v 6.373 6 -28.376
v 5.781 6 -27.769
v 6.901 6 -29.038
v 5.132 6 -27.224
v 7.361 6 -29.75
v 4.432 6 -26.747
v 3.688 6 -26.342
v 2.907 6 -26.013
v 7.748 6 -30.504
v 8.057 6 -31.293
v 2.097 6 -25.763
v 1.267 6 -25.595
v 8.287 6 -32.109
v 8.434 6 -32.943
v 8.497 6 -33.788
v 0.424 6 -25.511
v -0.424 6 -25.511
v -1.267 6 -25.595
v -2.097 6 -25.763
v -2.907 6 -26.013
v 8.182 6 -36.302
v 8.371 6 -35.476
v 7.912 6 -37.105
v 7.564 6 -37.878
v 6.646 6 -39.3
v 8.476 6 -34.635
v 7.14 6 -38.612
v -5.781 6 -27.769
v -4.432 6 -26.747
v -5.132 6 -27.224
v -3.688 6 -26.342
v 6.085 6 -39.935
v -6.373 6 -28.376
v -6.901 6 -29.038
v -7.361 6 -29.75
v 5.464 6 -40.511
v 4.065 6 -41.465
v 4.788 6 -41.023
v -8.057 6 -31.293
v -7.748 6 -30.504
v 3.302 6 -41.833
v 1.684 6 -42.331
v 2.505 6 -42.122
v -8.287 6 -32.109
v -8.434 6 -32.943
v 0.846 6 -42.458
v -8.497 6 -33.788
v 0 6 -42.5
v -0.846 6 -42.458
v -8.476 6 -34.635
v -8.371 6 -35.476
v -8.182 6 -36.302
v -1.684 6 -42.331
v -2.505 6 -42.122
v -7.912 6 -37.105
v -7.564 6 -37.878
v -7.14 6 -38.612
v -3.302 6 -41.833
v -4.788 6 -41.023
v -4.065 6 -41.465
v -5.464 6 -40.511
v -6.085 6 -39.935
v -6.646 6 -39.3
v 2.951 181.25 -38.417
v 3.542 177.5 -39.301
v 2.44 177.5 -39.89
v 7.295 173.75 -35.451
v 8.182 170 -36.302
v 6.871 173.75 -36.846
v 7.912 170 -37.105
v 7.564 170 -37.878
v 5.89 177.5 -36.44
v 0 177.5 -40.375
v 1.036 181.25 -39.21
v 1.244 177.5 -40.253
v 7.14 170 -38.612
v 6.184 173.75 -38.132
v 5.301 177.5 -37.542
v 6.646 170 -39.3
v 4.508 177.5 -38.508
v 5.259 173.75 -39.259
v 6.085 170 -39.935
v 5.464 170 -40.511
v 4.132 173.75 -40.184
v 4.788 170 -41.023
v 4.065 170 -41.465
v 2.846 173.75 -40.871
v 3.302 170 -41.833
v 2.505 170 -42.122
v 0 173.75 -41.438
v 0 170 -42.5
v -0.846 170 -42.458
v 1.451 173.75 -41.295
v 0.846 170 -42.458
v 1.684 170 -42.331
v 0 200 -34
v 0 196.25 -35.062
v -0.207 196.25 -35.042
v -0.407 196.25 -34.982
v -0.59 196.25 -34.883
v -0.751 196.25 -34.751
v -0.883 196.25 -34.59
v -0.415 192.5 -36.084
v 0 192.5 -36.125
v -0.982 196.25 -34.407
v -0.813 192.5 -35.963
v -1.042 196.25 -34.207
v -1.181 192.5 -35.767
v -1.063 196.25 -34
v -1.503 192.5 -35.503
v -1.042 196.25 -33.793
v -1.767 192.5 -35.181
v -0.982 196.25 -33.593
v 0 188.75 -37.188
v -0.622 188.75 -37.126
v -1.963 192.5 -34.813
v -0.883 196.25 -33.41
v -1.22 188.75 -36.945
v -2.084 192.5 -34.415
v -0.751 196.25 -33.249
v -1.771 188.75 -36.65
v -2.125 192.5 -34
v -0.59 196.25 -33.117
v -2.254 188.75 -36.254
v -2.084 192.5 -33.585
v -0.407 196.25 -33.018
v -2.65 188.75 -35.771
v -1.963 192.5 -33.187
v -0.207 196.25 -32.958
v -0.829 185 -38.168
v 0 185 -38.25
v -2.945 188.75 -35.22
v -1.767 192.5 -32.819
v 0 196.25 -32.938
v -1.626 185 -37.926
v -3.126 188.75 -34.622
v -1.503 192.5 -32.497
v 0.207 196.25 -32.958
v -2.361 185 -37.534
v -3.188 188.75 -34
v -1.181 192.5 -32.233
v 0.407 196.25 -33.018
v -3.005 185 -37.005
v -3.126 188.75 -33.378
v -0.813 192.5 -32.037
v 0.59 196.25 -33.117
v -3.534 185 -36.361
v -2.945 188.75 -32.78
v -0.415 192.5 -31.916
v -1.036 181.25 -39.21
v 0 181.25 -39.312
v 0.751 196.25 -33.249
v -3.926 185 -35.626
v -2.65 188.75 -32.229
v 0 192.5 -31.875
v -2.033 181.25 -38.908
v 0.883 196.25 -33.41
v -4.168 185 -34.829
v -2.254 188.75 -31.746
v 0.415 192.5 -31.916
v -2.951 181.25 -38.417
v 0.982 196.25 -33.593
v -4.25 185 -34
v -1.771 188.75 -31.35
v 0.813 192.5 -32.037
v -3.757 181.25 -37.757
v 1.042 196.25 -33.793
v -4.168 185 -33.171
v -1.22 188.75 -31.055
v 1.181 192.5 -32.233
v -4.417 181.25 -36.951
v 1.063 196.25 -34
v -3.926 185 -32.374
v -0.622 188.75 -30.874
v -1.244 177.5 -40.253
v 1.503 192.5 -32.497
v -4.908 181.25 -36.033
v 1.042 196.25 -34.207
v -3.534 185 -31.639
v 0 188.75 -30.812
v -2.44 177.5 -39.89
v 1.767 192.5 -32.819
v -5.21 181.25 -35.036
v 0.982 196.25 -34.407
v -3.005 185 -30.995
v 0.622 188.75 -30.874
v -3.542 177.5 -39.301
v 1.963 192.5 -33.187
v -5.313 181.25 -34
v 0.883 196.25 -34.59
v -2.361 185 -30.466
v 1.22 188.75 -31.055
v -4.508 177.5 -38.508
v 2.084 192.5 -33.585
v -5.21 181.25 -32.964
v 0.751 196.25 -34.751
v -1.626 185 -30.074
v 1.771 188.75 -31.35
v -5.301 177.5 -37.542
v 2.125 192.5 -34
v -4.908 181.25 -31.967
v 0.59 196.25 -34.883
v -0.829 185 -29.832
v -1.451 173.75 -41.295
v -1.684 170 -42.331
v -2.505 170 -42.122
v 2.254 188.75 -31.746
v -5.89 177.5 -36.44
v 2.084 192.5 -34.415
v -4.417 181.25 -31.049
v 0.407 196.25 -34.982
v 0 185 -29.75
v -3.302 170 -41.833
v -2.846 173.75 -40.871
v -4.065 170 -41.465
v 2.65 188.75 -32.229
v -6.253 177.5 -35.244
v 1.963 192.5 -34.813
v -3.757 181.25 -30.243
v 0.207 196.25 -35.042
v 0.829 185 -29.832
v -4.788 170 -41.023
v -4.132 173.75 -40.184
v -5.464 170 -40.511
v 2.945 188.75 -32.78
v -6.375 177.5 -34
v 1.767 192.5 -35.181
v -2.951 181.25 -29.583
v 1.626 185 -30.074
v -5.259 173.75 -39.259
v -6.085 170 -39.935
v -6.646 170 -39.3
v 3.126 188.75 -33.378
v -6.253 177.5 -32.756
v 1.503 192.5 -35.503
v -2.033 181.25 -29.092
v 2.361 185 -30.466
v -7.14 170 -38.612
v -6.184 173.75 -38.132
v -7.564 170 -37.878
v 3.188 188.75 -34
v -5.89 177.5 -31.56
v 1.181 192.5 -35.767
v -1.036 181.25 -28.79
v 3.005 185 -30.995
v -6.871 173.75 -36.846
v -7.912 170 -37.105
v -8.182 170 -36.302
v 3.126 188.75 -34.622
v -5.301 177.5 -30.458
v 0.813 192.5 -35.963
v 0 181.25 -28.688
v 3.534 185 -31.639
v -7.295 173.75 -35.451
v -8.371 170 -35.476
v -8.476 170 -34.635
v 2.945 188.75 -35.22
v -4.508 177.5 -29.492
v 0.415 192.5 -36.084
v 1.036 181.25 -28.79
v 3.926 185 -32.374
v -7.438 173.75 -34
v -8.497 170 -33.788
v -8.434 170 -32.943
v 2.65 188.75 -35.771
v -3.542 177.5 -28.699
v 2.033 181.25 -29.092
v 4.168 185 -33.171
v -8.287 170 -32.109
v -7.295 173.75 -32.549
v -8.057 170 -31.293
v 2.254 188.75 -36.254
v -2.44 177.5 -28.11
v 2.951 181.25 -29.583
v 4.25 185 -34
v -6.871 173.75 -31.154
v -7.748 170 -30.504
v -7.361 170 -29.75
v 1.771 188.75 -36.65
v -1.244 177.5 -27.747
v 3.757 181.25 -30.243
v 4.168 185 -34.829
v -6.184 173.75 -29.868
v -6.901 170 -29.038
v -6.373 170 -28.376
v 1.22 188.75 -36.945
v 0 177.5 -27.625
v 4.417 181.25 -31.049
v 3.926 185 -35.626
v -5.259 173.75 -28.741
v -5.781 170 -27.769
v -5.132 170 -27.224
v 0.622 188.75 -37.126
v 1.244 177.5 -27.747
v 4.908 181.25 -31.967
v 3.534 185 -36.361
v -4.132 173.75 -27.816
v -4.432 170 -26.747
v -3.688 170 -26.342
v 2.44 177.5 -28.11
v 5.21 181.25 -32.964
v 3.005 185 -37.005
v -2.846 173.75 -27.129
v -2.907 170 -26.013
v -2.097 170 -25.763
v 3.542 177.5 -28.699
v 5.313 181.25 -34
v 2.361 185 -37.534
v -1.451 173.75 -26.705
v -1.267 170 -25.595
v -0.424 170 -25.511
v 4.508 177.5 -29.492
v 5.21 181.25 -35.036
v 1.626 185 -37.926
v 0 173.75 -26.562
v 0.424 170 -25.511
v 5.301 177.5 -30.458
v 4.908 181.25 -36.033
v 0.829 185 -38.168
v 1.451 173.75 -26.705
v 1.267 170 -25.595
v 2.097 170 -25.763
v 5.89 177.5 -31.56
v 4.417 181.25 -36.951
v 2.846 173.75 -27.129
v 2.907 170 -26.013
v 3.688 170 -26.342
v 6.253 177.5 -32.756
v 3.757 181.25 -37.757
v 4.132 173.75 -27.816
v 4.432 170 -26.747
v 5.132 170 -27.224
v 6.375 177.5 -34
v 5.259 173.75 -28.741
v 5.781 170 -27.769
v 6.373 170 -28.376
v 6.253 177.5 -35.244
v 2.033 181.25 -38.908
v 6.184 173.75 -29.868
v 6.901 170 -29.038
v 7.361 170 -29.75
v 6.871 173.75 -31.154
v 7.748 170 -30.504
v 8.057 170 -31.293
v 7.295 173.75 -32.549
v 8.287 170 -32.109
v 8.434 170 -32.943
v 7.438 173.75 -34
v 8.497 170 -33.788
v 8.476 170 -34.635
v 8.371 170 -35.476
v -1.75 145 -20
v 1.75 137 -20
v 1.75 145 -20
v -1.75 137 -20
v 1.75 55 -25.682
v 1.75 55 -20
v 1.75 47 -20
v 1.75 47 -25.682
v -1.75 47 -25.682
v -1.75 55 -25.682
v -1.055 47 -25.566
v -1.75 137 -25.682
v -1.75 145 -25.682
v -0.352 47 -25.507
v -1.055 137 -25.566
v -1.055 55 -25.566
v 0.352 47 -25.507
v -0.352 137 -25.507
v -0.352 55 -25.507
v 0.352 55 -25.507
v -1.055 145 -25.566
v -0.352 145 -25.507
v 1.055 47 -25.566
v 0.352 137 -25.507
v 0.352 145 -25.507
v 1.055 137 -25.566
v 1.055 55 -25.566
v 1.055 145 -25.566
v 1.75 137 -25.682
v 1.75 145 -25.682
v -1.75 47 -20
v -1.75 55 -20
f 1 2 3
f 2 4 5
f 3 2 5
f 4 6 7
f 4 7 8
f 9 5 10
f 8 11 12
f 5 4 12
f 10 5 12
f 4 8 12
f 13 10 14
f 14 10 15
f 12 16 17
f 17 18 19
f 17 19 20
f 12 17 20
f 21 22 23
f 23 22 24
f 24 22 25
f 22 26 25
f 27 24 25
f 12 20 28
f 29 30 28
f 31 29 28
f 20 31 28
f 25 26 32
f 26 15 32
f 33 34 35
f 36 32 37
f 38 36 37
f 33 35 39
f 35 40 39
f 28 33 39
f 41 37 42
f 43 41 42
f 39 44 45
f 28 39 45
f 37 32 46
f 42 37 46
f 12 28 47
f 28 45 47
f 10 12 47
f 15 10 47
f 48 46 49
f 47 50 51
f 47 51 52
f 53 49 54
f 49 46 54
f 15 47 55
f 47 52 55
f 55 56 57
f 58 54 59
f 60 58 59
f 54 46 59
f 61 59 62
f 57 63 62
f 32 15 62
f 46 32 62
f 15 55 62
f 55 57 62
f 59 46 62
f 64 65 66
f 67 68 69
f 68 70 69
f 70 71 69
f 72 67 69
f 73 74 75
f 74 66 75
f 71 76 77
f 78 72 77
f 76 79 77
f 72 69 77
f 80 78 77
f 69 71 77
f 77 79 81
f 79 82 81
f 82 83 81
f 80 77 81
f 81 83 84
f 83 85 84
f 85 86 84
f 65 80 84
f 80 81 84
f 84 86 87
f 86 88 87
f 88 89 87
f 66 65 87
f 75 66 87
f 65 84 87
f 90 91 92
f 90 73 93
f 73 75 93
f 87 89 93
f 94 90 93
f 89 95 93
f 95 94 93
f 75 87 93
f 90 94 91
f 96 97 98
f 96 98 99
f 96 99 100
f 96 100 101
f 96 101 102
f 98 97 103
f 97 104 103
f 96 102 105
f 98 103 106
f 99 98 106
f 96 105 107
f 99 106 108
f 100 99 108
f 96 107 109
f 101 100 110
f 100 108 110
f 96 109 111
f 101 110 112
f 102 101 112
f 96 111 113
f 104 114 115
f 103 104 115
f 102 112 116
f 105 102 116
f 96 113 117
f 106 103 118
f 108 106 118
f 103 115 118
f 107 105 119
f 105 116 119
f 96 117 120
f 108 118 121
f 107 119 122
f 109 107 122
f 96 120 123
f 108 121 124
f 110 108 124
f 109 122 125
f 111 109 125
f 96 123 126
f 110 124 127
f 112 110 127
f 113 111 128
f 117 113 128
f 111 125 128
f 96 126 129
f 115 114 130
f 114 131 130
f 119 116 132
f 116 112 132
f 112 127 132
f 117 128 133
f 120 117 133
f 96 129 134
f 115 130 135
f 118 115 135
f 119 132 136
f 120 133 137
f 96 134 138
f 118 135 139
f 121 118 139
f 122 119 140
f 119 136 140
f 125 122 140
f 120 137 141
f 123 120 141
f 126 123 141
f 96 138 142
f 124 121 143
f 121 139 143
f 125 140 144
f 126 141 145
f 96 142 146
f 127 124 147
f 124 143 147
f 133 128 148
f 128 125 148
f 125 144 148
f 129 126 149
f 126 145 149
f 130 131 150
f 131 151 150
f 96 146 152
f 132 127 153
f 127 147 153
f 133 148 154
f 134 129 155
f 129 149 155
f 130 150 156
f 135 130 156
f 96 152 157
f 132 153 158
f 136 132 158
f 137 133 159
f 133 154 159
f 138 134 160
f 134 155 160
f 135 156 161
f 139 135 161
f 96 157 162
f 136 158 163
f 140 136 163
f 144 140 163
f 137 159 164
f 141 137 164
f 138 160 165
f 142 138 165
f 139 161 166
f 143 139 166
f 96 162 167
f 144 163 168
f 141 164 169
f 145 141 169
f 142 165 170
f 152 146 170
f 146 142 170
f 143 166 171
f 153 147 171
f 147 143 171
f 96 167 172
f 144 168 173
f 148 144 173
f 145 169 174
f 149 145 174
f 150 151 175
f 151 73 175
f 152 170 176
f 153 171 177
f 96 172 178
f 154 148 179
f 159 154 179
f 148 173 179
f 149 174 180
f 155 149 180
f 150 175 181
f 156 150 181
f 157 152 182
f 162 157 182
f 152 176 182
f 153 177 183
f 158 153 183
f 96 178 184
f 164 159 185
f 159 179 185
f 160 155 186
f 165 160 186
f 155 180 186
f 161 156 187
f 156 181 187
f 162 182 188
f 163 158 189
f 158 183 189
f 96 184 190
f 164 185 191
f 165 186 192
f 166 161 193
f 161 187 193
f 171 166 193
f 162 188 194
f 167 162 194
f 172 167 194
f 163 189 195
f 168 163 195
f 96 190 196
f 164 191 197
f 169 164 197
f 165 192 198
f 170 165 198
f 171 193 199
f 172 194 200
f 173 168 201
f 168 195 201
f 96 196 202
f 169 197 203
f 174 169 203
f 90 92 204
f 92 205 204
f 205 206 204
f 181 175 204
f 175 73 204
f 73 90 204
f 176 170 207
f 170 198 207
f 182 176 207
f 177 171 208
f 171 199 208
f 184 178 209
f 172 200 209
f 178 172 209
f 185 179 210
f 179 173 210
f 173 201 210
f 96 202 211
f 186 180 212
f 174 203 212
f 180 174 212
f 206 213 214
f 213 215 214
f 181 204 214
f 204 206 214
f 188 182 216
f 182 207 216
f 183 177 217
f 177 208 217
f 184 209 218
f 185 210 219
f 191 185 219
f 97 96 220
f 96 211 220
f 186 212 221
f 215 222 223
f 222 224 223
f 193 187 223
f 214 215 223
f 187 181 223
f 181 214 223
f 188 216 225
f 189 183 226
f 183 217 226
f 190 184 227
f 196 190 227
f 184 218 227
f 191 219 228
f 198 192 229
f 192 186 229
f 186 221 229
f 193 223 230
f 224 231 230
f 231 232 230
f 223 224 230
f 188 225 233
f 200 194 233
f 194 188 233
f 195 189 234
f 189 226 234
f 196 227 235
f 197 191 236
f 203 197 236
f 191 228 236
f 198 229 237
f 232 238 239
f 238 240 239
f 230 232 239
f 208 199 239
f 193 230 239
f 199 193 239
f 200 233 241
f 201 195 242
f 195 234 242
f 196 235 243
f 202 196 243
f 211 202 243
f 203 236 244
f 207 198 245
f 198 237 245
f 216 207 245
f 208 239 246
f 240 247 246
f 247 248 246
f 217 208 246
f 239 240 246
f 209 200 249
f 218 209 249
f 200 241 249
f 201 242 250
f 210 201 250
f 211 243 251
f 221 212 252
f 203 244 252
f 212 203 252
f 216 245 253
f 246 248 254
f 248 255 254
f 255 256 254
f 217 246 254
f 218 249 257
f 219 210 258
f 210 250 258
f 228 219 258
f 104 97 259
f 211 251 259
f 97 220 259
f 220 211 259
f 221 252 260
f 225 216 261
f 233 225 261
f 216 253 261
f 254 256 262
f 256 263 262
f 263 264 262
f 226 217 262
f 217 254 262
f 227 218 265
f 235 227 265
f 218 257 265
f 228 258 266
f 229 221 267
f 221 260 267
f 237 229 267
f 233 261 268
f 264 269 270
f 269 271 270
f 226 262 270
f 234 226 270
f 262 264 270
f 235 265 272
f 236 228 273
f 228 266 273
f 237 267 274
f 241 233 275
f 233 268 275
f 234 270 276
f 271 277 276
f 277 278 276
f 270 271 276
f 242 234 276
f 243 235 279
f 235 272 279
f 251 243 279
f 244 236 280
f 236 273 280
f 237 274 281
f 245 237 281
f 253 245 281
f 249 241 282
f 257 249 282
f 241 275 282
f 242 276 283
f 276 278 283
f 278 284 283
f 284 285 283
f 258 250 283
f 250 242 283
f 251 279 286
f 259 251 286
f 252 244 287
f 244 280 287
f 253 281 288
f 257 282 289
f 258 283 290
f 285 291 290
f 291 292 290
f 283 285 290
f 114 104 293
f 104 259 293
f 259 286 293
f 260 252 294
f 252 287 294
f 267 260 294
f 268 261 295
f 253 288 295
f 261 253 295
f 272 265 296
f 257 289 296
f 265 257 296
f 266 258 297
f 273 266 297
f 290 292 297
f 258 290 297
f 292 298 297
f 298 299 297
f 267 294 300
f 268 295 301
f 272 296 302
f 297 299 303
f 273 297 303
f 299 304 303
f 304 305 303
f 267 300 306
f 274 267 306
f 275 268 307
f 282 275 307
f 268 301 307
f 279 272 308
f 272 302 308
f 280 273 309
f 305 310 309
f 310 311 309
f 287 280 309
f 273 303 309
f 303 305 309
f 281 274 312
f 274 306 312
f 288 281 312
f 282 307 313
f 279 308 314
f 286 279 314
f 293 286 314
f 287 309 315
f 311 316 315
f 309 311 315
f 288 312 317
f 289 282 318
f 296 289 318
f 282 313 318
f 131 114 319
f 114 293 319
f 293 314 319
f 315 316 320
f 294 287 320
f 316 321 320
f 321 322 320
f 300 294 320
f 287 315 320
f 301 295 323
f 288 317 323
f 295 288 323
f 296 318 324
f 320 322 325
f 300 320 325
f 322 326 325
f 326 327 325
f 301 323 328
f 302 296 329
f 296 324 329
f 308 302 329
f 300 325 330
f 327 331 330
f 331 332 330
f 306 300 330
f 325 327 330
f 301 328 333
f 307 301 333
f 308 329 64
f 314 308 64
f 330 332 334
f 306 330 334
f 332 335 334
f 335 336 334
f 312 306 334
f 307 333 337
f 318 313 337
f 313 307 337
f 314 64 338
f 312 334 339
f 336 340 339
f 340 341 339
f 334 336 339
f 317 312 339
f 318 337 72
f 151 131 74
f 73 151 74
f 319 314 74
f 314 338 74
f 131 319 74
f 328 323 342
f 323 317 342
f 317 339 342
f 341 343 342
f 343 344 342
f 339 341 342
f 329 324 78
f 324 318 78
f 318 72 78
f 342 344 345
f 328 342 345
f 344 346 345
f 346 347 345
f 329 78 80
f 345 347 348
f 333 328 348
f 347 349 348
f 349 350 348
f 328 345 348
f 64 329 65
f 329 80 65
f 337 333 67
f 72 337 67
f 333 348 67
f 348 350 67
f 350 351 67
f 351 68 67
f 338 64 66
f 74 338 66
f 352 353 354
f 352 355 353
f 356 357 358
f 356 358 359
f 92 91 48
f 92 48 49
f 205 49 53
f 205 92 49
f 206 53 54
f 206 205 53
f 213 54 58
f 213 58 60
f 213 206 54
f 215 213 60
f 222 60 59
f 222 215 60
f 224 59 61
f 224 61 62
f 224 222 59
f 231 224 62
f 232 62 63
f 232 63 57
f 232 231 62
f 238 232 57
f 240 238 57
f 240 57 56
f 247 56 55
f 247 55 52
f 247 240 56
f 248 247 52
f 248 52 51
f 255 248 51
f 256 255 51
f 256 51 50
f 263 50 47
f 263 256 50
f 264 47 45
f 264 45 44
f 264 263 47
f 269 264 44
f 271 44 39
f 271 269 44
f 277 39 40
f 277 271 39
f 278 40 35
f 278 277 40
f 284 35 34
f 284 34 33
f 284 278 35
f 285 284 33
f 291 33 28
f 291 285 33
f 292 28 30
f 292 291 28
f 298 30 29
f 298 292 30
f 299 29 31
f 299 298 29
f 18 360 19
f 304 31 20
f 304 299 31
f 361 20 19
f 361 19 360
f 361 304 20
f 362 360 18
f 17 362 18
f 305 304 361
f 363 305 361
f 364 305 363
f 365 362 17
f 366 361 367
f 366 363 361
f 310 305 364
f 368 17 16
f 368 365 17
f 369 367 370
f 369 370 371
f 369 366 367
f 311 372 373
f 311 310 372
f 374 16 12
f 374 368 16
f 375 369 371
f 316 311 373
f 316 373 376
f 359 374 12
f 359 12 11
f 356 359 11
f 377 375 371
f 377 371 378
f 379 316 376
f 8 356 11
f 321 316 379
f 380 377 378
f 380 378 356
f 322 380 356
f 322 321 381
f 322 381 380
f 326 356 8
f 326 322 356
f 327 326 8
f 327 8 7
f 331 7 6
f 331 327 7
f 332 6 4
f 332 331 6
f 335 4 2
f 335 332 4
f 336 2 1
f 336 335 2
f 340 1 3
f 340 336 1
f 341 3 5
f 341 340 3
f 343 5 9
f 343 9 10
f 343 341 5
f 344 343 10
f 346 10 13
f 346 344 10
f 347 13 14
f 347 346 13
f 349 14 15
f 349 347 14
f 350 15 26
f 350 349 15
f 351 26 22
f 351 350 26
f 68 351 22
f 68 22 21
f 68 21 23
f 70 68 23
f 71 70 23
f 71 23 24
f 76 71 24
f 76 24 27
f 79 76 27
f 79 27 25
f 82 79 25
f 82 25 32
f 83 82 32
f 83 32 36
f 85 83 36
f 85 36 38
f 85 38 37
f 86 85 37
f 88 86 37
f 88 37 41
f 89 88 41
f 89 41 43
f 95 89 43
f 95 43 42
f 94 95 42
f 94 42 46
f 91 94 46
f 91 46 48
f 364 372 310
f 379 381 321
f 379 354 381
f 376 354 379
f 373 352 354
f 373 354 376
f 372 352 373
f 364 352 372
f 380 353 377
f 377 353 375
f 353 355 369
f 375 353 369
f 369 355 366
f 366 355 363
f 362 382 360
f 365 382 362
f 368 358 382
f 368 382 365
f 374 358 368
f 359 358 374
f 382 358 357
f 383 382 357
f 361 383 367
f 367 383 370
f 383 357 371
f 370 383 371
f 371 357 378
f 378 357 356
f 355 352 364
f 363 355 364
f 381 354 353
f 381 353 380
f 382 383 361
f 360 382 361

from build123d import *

# Parameters (mm, degrees)
SKETCH3_W           = 14
SKETCH3_H           = 8
BOSS_EXTRUDE2_DEPTH = 1.75


with BuildPart() as part:
    # Sketch2 → Revolve2 (revolve)
    with BuildSketch(Plane(origin=(0, 0, 0), x_dir=(0, 0, -1), z_dir=(1, 0, 0))):
        Polygon((34, 200), (42.5, 170), (42.5, 20), (42.5, 10), (42.5, 6), (34, 6), align=None)
    revolve(axis=Axis((0, 6, -34), (0, 1, 0)))

    # Sketch3 → Boss-Extrude2 (add, symmetric)
    with BuildSketch(Plane(origin=(0, 0, 0), x_dir=(0, 0, -1), z_dir=(1, 0, 0))):
        with Locations((27, 141)):
            Rectangle(SKETCH3_W, SKETCH3_H)
        with Locations((27, 51)):
            Rectangle(SKETCH3_W, SKETCH3_H)
    extrude(amount=BOSS_EXTRUDE2_DEPTH, both=True)


solid = part.part
